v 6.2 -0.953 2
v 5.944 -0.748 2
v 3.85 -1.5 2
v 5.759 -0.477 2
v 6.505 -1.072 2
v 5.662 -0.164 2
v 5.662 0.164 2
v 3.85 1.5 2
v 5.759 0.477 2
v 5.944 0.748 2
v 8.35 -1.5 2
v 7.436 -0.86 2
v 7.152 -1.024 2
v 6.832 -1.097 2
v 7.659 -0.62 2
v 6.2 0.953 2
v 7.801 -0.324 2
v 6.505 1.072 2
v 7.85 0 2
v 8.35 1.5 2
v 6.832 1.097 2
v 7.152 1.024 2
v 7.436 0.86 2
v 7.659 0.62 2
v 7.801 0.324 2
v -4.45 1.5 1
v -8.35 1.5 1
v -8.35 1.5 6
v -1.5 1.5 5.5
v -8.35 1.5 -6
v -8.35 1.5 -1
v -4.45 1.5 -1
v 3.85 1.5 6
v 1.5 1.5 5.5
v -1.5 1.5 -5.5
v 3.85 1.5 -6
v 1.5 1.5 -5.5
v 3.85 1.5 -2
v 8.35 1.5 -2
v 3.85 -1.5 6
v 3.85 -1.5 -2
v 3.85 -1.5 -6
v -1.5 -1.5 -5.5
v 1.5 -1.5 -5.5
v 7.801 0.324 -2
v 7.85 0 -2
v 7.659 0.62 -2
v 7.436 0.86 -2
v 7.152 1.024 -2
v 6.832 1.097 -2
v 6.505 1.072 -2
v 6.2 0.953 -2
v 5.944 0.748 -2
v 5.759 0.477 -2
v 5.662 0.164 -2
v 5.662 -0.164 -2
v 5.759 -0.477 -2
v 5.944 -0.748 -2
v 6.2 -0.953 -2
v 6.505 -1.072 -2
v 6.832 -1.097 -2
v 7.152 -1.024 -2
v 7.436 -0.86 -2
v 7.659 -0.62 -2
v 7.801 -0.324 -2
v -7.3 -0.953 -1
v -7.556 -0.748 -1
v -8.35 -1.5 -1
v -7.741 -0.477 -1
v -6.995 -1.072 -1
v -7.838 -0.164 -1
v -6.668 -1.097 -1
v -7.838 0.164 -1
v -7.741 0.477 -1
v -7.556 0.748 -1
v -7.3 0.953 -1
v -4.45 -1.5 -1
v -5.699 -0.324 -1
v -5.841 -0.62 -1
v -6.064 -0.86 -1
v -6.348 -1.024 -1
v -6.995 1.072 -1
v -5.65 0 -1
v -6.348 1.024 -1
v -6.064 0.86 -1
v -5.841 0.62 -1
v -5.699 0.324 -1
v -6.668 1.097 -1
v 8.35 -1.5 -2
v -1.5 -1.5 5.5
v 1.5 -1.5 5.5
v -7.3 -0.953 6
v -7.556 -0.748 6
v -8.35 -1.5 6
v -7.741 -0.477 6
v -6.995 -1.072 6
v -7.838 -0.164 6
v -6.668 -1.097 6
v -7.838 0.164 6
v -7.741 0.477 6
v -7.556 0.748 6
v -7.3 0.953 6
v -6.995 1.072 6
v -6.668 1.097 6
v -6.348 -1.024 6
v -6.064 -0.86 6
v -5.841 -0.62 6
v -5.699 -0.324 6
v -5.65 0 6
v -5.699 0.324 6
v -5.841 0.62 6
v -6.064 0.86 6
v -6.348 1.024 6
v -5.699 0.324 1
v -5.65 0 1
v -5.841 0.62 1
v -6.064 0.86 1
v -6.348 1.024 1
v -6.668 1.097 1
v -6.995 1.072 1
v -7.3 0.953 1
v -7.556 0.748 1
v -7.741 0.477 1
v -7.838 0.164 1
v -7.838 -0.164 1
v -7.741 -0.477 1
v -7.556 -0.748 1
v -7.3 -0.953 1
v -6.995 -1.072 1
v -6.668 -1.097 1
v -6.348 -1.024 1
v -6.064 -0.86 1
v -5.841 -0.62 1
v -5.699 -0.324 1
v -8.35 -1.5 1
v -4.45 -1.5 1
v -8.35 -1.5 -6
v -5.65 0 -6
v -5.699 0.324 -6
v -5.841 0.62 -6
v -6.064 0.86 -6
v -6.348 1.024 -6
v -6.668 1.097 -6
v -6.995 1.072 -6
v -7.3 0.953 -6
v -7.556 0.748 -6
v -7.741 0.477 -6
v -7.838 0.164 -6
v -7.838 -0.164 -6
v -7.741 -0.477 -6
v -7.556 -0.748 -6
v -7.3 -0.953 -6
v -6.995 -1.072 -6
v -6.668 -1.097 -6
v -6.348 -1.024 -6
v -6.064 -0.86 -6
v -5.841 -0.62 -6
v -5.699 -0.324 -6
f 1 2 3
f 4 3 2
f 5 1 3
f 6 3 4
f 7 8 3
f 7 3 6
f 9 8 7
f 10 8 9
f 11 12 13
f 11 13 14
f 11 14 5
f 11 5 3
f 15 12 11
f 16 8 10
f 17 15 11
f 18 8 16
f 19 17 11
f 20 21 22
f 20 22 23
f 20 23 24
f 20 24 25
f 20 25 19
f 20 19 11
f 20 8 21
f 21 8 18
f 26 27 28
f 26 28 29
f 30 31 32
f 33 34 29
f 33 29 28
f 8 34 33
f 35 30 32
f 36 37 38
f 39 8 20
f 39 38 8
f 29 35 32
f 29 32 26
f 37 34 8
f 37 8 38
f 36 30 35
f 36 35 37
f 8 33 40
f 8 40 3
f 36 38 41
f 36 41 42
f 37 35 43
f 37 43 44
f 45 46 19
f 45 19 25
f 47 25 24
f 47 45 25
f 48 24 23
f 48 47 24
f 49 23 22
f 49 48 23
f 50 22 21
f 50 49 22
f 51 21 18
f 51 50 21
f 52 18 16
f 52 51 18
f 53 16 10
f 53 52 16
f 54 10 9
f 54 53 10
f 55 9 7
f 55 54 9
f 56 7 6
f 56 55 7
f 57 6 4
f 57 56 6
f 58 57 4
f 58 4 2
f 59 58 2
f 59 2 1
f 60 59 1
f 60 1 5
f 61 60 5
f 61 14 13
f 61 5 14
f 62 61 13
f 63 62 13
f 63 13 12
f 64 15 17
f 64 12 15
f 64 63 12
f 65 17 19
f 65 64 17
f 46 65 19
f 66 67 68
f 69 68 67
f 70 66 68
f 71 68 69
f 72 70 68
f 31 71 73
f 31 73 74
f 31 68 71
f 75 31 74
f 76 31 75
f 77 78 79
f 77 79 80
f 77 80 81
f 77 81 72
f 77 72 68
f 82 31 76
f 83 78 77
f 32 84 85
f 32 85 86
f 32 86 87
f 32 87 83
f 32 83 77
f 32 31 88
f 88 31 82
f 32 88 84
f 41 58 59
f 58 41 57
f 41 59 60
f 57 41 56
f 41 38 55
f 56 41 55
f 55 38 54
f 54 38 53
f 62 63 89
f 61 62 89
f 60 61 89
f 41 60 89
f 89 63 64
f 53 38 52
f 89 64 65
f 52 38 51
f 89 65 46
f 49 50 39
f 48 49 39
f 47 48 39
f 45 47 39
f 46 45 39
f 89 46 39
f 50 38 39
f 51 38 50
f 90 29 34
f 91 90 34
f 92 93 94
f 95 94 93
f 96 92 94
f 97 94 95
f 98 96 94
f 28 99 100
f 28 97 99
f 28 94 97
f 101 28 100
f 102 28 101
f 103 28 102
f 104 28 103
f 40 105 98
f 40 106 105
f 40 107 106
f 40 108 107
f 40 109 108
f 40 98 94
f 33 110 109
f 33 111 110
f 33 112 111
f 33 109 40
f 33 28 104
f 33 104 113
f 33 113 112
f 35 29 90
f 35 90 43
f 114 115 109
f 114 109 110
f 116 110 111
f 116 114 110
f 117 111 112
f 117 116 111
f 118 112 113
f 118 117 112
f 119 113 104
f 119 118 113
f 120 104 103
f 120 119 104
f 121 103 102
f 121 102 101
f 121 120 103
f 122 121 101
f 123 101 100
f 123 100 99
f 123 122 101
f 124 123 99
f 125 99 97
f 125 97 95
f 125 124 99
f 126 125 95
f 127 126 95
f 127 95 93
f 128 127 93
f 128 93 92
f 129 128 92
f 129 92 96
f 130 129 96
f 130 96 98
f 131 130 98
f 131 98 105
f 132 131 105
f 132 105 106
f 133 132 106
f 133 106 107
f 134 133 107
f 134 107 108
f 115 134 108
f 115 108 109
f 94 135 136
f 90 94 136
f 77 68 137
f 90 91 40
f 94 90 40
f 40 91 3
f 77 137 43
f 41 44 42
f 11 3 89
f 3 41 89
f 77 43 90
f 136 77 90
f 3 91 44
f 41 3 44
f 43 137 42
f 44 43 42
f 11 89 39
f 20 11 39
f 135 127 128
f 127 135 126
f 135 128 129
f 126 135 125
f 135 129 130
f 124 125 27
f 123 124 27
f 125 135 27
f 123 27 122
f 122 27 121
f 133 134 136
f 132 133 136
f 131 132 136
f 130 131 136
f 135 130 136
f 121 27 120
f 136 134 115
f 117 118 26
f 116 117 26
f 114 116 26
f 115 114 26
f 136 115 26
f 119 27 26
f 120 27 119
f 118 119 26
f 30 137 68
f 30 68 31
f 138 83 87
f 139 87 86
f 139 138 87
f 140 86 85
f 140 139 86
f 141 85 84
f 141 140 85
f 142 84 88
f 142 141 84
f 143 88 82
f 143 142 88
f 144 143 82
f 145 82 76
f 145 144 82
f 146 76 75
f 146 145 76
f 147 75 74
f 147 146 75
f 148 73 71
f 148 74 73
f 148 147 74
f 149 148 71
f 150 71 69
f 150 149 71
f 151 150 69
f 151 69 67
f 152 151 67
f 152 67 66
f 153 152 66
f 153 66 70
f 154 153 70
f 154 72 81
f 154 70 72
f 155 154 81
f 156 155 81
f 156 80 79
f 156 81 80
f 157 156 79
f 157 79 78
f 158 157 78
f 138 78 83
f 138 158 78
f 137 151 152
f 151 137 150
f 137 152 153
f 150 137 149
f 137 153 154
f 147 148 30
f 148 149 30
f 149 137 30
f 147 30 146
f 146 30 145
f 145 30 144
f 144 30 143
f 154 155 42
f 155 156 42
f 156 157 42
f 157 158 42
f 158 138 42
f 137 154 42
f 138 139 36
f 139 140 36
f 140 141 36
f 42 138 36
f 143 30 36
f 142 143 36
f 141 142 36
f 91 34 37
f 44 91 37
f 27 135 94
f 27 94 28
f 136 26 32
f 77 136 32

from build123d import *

# Parameters (mm, degrees)
BOSS_EXTRUDE1_DEPTH      = 6
BOSS_EXTRUDE1_DEPTH_BACK = 6
SKETCH1_W                = 16.7
SKETCH1_H                = 3
SKETCH1_R                = 1.1
SKETCH2_W                = 3
SKETCH2_H                = 11
SKETCH2_W_2              = 9
SKETCH2_H_2              = 8
SKETCH2_W_3              = 7.8
SKETCH2_H_3              = 2
CUT_EXTRUDE1_DEPTH       = 5


with BuildPart() as part:
    # Sketch1 → Boss-Extrude1 (new, two sides: drawn at the far end of the back side and taken through both)
    with BuildSketch(Plane.XY.offset(-BOSS_EXTRUDE1_DEPTH_BACK)):
        Rectangle(SKETCH1_W, SKETCH1_H)
        with Locations((-6.75, 0)):
            Circle(SKETCH1_R, mode=Mode.SUBTRACT)
        with Locations((6.75, 0)):
            Circle(SKETCH1_R, mode=Mode.SUBTRACT)
    extrude(amount=BOSS_EXTRUDE1_DEPTH + BOSS_EXTRUDE1_DEPTH_BACK)

    # Sketch2 → Cut-Extrude1 (cut)
    with BuildSketch(Plane(origin=(0, 1.5, 0), x_dir=(1, 0, 0), z_dir=(0, 1, 0))):
        Rectangle(SKETCH2_W, SKETCH2_H)
        with Locations((8.35, -6)):
            Rectangle(SKETCH2_W_2, SKETCH2_H_2)
        with Locations((8.35, 6)):
            Rectangle(SKETCH2_W_2, SKETCH2_H_2)
        with Locations((-8.35, 0)):
            Rectangle(SKETCH2_W_3, SKETCH2_H_3)
    extrude(amount=-CUT_EXTRUDE1_DEPTH, mode=Mode.SUBTRACT)


solid = part.part
